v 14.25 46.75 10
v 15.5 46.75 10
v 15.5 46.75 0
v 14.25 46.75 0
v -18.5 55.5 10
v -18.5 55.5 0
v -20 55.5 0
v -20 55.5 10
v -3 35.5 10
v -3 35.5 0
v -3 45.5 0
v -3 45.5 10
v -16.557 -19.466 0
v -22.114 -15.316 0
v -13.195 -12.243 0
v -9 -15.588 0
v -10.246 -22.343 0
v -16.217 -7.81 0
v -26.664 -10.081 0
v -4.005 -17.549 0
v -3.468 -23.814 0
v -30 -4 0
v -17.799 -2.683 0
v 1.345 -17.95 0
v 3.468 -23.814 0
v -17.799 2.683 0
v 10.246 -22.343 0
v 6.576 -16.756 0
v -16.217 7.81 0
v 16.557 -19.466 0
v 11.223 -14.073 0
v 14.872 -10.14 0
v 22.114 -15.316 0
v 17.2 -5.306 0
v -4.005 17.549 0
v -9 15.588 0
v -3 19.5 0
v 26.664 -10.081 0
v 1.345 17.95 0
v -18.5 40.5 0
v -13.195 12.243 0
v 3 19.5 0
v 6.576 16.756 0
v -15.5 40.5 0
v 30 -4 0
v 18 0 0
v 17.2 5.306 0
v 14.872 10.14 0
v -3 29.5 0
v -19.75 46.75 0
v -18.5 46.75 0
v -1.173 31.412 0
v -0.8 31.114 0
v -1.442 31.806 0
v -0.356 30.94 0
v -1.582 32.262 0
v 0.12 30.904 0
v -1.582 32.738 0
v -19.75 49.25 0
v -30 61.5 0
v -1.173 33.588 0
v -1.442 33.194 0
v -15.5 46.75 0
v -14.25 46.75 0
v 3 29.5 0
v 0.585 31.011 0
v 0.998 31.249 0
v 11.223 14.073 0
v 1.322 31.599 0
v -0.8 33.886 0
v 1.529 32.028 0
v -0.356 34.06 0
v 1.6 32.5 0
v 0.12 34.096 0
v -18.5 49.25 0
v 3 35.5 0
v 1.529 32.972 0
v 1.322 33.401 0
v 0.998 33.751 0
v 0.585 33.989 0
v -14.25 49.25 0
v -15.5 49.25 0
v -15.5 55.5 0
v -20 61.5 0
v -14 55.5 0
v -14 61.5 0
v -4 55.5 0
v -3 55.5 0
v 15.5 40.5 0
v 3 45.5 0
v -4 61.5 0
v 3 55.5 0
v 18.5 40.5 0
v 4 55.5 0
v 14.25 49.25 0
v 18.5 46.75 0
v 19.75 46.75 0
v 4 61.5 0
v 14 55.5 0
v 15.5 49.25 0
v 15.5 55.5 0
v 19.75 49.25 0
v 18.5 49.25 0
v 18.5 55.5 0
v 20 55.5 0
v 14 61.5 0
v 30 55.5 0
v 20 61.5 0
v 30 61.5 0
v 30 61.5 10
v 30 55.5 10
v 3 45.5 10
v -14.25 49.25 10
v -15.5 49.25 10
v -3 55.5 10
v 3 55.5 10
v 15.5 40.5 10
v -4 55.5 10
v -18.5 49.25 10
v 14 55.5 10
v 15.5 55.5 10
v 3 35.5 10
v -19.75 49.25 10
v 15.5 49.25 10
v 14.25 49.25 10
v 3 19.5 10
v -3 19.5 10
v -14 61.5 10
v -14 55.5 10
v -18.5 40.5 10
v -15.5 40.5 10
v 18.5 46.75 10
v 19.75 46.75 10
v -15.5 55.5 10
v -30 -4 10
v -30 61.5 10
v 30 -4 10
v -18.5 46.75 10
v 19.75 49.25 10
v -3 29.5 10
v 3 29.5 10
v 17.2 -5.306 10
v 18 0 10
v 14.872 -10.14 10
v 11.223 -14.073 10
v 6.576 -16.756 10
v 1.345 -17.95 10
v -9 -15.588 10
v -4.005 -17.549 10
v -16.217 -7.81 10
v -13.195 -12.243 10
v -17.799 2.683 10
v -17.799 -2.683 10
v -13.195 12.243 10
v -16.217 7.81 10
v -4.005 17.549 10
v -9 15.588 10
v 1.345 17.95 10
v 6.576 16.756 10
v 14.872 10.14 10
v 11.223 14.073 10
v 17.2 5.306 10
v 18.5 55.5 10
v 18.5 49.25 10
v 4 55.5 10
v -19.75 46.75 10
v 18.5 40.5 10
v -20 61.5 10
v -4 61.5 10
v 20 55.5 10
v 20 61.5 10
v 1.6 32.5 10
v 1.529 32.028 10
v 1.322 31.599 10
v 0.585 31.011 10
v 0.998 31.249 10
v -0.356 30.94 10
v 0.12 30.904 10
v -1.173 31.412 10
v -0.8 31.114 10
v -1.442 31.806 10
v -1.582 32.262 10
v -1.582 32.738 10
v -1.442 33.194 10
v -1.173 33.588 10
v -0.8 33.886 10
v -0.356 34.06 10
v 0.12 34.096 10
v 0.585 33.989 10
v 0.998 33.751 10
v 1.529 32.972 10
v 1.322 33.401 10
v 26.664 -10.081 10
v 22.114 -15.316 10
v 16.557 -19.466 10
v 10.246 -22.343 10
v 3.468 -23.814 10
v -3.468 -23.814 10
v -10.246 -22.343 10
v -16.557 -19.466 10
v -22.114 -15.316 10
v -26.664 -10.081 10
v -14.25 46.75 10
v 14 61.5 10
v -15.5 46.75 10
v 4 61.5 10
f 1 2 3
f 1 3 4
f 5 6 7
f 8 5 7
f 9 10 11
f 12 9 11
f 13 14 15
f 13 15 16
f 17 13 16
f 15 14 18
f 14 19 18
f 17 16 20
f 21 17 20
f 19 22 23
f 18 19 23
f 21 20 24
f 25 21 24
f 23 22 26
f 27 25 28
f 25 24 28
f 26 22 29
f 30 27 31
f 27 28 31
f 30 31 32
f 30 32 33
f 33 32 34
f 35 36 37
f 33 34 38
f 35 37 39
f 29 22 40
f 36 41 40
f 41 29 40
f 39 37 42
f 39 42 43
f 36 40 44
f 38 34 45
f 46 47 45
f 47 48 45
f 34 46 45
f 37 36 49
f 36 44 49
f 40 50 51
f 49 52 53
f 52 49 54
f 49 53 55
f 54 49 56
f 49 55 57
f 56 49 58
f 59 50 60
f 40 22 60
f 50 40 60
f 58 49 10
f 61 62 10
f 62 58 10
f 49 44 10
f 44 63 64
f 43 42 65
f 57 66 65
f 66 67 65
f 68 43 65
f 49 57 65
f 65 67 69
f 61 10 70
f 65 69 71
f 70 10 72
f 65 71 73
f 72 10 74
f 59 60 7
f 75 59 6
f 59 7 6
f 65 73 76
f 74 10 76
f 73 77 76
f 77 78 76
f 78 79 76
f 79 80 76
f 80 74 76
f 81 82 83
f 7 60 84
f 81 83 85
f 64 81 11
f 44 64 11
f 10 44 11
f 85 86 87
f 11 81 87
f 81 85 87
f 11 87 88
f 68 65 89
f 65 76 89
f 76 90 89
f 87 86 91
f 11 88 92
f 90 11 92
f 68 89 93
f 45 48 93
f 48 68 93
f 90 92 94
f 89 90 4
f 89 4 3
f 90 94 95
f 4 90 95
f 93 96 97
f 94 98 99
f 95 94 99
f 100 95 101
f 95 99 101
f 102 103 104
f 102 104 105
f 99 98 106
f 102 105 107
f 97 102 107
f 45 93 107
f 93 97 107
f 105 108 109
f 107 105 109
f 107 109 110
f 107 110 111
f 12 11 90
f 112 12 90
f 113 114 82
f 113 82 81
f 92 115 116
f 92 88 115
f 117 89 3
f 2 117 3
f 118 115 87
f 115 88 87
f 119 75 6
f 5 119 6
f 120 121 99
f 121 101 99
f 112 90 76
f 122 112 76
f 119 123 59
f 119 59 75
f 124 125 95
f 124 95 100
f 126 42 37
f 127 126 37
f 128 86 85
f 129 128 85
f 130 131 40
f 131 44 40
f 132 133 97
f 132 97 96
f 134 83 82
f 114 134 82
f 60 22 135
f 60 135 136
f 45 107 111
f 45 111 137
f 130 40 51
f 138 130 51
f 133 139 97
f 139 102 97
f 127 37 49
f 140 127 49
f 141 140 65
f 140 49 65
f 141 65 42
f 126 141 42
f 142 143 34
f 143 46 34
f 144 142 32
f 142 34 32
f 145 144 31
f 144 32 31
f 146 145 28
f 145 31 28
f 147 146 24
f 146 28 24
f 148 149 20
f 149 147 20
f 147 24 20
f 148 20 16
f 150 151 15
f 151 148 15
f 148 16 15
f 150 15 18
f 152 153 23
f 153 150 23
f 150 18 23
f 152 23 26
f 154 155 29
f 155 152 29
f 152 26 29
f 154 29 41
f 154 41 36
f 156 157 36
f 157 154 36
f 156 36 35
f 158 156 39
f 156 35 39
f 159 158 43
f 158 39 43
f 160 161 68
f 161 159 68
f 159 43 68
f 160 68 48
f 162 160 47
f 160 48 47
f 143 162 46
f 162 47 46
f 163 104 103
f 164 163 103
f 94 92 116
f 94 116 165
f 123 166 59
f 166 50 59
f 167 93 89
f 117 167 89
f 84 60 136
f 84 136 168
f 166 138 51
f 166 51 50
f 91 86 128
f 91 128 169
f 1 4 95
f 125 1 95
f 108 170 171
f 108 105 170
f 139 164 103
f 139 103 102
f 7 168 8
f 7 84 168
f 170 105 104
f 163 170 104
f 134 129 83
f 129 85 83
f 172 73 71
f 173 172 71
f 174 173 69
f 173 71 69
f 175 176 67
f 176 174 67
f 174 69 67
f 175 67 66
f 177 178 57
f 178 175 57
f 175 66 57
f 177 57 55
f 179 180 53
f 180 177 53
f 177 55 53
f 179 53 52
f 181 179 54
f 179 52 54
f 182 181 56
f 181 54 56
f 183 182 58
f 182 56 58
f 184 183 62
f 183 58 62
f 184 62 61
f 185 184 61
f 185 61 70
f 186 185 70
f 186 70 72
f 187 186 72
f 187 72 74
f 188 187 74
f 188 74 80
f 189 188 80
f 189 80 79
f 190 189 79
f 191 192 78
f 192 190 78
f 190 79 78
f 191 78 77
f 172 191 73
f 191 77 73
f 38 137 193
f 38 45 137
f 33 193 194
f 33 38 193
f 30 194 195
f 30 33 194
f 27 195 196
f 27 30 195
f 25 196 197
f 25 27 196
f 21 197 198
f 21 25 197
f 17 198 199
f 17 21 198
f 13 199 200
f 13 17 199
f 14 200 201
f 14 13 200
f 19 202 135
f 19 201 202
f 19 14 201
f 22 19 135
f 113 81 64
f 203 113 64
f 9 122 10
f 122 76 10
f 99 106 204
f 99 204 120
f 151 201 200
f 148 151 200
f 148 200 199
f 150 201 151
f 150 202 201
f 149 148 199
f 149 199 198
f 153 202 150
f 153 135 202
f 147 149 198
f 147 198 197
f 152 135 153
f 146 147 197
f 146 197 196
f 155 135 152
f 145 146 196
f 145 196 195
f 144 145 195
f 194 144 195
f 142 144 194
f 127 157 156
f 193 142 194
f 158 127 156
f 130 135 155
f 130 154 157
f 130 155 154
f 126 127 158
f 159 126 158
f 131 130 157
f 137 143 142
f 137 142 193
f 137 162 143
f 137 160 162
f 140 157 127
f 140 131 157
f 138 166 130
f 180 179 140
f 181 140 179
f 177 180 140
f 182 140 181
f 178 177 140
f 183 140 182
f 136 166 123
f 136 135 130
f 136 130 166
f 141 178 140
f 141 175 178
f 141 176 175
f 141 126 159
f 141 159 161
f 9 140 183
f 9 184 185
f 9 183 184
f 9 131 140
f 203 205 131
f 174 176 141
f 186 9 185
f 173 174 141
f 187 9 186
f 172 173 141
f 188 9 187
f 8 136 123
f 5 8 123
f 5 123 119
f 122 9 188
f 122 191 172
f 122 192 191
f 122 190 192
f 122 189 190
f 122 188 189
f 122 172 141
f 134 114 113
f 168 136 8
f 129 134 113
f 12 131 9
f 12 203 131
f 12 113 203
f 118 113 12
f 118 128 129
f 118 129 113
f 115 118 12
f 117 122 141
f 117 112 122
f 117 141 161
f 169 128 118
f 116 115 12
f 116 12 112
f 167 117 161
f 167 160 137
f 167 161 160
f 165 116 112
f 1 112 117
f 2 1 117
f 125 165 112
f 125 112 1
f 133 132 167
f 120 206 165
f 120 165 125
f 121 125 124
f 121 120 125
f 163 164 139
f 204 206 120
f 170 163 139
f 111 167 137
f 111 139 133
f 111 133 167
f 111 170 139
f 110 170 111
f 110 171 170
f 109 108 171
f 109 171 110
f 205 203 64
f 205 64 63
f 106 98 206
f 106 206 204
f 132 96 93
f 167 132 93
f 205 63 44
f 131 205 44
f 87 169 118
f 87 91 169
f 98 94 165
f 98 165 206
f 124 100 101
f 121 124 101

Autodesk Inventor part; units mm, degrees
ref_plane "YZ Plane" through (0, 0, 0) normal (1, 0, 0) x (0, 1, 0)
ref_plane "XZ Plane" through (0, 0, 0) normal (0, 1, 0) x (-1, 0, 0)
ref_plane "XY Plane" through (0, 0, 0) normal (0, 0, 1) x (1, 0, 0)
sketch "0" plane through (0, 0, 0) normal (0, 0, 1) x (1, 0, 0)
  line L0 (4, 55.5) -> (4, 61.5)
  line L1 (4, 61.5) -> (14, 61.5)
  line L2 (14, 61.5) -> (14, 55.5)
  line L3 (20, 55.5) -> (18.5, 55.5)
  line L4 (18.5, 55.5) -> (18.5, 49.25)
  line L5 (18.5, 40.5) -> (15.5, 40.5)
  line L6 (15.5, 40.5) -> (15.5, 46.75)
  line L7 (14.25, 49.25) -> (15.5, 49.25)
  line L8 (19.75, 49.25) -> (19.75, 46.75)
  line L9 (19.75, 46.75) -> (18.5, 46.75)
  line L10 (14.25, 46.75) -> (14.25, 49.25)
  line L11 (15.5, 49.25) -> (15.5, 55.5)
  line L12 (15.5, 46.75) -> (14.25, 46.75)
  line L13 (18.5, 49.25) -> (19.75, 49.25)
  line L14 (15.5, 55.5) -> (14, 55.5)
  line L15 (20, 61.5) -> (30, 61.5)
  line L16 (20, 55.5) -> (20, 61.5)
  line L17 (18.5, 46.75) -> (18.5, 40.5)
  line L18 (-30, 61.5) -> (-20, 61.5)
  line L19 (-20, 61.5) -> (-20, 55.5)
  line L20 (-14, 55.5) -> (-15.5, 55.5)
  line L21 (-15.5, 55.5) -> (-15.5, 49.25)
  line L22 (-15.5, 40.5) -> (-18.5, 40.5)
  line L23 (-18.5, 40.5) -> (-18.5, 46.75)
  line L24 (-19.75, 49.25) -> (-18.5, 49.25)
  line L25 (-14.25, 49.25) -> (-14.25, 46.75)
  line L26 (-14.25, 46.75) -> (-15.5, 46.75)
  line L27 (-19.75, 46.75) -> (-19.75, 49.25)
  line L28 (-18.5, 49.25) -> (-18.5, 55.5)
  line L29 (-18.5, 46.75) -> (-19.75, 46.75)
  line L30 (-15.5, 49.25) -> (-14.25, 49.25)
  line L31 (-18.5, 55.5) -> (-20, 55.5)
  line L32 (-14, 61.5) -> (-4, 61.5)
  line L33 (-14, 55.5) -> (-14, 61.5)
  line L34 (-4, 61.5) -> (-4, 55.5)
  line L35 (-15.5, 46.75) -> (-15.5, 40.5)
  line L36 (-3, 55.5) -> (-4, 55.5)
  line L37 (3, 55.5) -> (4, 55.5)
  line L38 (30, 61.5) -> (30, 55.5)
  circle A0 centre (0, 0) radius 18
  line L39 (30, 55.5) -> (30, -4)
  line L40 (-30, -4) -> (-30, 61.5)
  arc A1 (-30, -4) -> (30, -4) centre (0, 8.5) ccw
  line L41 (-3, 19.5) -> (-3, 29.5)
  line L42 (-3, 29.5) -> (3, 29.5)
  line L43 (3, 29.5) -> (3, 19.5)
  line L44 (3, 19.5) -> (-3, 19.5)
  line L45 (-3, 35.5) -> (-3, 45.5)
  line L46 (3, 45.5) -> (3, 35.5)
  line L47 (3, 35.5) -> (-3, 35.5)
  circle A2 centre (0, 32.5) radius 1.6
  line L48 (-3, 45.5) -> (3, 45.5)
  line L49 (-3, 55.5) -> (3, 55.5)
  point P0 (-30, -4)
  point P1 (30, -4)
sketch "Эскиз3" plane through (0, 0, 0) normal (0, 0, 1) x (1, 0, 0)
  circle A0 centre (0, 0) radius 18 projected
  circle A1 centre (0, 32.5) radius 1.6 projected
  line L0 (30, 55.5) -> (30, -4) projected
  line L1 (-30, -4) -> (-30, 61.5) projected
  line L2 (-30, 61.5) -> (-20, 61.5) projected
  line L3 (30, 61.5) -> (30, 55.5) projected
  line L4 (20, 61.5) -> (30, 61.5) projected
  line L5 (20, 55.5) -> (20, 61.5) projected
  line L6 (20, 55.5) -> (18.5, 55.5) projected
  line L7 (18.5, 55.5) -> (18.5, 49.25) projected
  line L8 (18.5, 49.25) -> (19.75, 49.25) projected
  line L9 (19.75, 49.25) -> (19.75, 46.75) projected
  line L10 (19.75, 46.75) -> (18.5, 46.75) projected
  line L11 (18.5, 46.75) -> (18.5, 40.5) projected
  line L12 (18.5, 40.5) -> (15.5, 40.5) projected
  line L13 (15.5, 40.5) -> (15.5, 46.75) projected
  line L14 (15.5, 46.75) -> (14.25, 46.75) projected
  line L15 (14.25, 46.75) -> (14.25, 49.25) projected
  line L16 (14.25, 49.25) -> (15.5, 49.25) projected
  line L17 (15.5, 49.25) -> (15.5, 55.5) projected
  line L18 (15.5, 55.5) -> (14, 55.5) projected
  line L19 (4, 61.5) -> (14, 61.5) projected
  line L20 (4, 55.5) -> (4, 61.5) projected
  line L21 (-3, 55.5) -> (3, 55.5) projected
  line L22 (3, 55.5) -> (4, 55.5) projected
  line L23 (14, 61.5) -> (14, 55.5) projected
  line L24 (-14, 61.5) -> (-4, 61.5) projected
  line L25 (-4, 61.5) -> (-4, 55.5) projected
  line L26 (-14, 55.5) -> (-15.5, 55.5) projected
  line L27 (-15.5, 55.5) -> (-15.5, 49.25) projected
  line L28 (-18.5, 49.25) -> (-18.5, 55.5) projected
  line L29 (-18.5, 55.5) -> (-20, 55.5) projected
  line L30 (-20, 61.5) -> (-20, 55.5) projected
  line L31 (-19.75, 49.25) -> (-18.5, 49.25) projected
  line L32 (-19.75, 46.75) -> (-19.75, 49.25) projected
  line L33 (-18.5, 46.75) -> (-19.75, 46.75) projected
  line L34 (-18.5, 40.5) -> (-18.5, 46.75) projected
  line L35 (-15.5, 40.5) -> (-18.5, 40.5) projected
  line L36 (-15.5, 46.75) -> (-15.5, 40.5) projected
  line L37 (-14.25, 46.75) -> (-15.5, 46.75) projected
  line L38 (-14.25, 49.25) -> (-14.25, 46.75) projected
  line L39 (-15.5, 49.25) -> (-14.25, 49.25) projected
  arc A2 (-30, -4) -> (30, -4) centre (0, 8.5) ccw projected
  line L40 (3, 29.5) -> (3, 19.5) projected
  line L41 (-3, 29.5) -> (3, 29.5) projected
  circle A3 centre (0, 0) radius 18
  circle A4 centre (0, 32.5) radius 1.6
  line L42 (-3, 45.5) -> (3, 45.5)
  line L43 (3, 45.5) -> (3, 35.5)
  line L44 (3, 35.5) -> (-3, 35.5)
  line L45 (-3, 35.5) -> (-3, 45.5)
  line L46 (-3, 29.5) -> (3, 29.5)
  line L47 (3, 29.5) -> (3, 19.5)
  line L48 (3, 19.5) -> (-3, 19.5)
  line L49 (-3, 19.5) -> (-3, 29.5)
  line L50 (18.5, 40.5) -> (15.5, 40.5)
  line L51 (15.5, 40.5) -> (15.5, 46.75)
  line L52 (18.5, 46.75) -> (18.5, 40.5)
  line L53 (19.75, 49.25) -> (19.75, 46.75)
  line L54 (14.25, 46.75) -> (14.25, 49.25)
  line L55 (18.5, 55.5) -> (18.5, 49.25)
  line L56 (15.5, 49.25) -> (15.5, 55.5)
  line L57 (20, 61.5) -> (20, 55.5)
  line L58 (14, 55.5) -> (14, 61.5)
  line L59 (4, 55.5) -> (-4, 55.5)
  line L60 (-4, 55.5) -> (-4, 61.5)
  line L61 (4, 61.5) -> (4, 55.5)
  line L62 (-20, 55.5) -> (-20, 61.5)
  line L63 (-14, 61.5) -> (-14, 55.5)
  line L64 (-15.5, 55.5) -> (-15.5, 49.25)
  line L65 (-18.5, 49.25) -> (-18.5, 55.5)
  line L66 (-14.25, 49.25) -> (-14.25, 46.75)
  line L67 (-19.75, 46.75) -> (-19.75, 49.25)
  line L68 (-15.5, 46.75) -> (-15.5, 40.5)
  line L69 (-15.5, 40.5) -> (-18.5, 40.5)
  line L70 (-18.5, 40.5) -> (-18.5, 46.75)
  line L71 (-14, 55.5) -> (-15.5, 55.5)
  line L72 (-18.5, 55.5) -> (-20, 55.5)
  line L73 (-19.75, 49.25) -> (-18.5, 49.25)
  line L74 (-15.5, 49.25) -> (-14.25, 49.25)
  line L75 (-14.25, 46.75) -> (-15.5, 46.75)
  line L76 (-18.5, 46.75) -> (-19.75, 46.75)
  line L77 (20, 55.5) -> (18.5, 55.5)
  line L78 (15.5, 55.5) -> (14, 55.5)
  line L79 (14.25, 49.25) -> (15.5, 49.25)
  line L80 (18.5, 49.25) -> (19.75, 49.25)
  line L81 (19.75, 46.75) -> (18.5, 46.75)
  line L82 (15.5, 46.75) -> (14.25, 46.75)
  line L83 (-30, 61.5) -> (-20, 61.5)
  line L84 (-14, 61.5) -> (-4, 61.5)
  line L85 (20, 61.5) -> (30, 61.5)
  line L86 (14, 61.5) -> (4, 61.5)
  line L87 (30, 61.5) -> (30, -4)
  line L88 (-30, -4) -> (-30, 61.5)
  arc A5 (-30, -4) -> (30, -4) centre (0, 8.5) ccw
  point P0 (0, 0)
extrude "Выдавливание2" add sketch "Эскиз3" along normal blind 10
properties part number "Крепление_мотора2_платформа"
